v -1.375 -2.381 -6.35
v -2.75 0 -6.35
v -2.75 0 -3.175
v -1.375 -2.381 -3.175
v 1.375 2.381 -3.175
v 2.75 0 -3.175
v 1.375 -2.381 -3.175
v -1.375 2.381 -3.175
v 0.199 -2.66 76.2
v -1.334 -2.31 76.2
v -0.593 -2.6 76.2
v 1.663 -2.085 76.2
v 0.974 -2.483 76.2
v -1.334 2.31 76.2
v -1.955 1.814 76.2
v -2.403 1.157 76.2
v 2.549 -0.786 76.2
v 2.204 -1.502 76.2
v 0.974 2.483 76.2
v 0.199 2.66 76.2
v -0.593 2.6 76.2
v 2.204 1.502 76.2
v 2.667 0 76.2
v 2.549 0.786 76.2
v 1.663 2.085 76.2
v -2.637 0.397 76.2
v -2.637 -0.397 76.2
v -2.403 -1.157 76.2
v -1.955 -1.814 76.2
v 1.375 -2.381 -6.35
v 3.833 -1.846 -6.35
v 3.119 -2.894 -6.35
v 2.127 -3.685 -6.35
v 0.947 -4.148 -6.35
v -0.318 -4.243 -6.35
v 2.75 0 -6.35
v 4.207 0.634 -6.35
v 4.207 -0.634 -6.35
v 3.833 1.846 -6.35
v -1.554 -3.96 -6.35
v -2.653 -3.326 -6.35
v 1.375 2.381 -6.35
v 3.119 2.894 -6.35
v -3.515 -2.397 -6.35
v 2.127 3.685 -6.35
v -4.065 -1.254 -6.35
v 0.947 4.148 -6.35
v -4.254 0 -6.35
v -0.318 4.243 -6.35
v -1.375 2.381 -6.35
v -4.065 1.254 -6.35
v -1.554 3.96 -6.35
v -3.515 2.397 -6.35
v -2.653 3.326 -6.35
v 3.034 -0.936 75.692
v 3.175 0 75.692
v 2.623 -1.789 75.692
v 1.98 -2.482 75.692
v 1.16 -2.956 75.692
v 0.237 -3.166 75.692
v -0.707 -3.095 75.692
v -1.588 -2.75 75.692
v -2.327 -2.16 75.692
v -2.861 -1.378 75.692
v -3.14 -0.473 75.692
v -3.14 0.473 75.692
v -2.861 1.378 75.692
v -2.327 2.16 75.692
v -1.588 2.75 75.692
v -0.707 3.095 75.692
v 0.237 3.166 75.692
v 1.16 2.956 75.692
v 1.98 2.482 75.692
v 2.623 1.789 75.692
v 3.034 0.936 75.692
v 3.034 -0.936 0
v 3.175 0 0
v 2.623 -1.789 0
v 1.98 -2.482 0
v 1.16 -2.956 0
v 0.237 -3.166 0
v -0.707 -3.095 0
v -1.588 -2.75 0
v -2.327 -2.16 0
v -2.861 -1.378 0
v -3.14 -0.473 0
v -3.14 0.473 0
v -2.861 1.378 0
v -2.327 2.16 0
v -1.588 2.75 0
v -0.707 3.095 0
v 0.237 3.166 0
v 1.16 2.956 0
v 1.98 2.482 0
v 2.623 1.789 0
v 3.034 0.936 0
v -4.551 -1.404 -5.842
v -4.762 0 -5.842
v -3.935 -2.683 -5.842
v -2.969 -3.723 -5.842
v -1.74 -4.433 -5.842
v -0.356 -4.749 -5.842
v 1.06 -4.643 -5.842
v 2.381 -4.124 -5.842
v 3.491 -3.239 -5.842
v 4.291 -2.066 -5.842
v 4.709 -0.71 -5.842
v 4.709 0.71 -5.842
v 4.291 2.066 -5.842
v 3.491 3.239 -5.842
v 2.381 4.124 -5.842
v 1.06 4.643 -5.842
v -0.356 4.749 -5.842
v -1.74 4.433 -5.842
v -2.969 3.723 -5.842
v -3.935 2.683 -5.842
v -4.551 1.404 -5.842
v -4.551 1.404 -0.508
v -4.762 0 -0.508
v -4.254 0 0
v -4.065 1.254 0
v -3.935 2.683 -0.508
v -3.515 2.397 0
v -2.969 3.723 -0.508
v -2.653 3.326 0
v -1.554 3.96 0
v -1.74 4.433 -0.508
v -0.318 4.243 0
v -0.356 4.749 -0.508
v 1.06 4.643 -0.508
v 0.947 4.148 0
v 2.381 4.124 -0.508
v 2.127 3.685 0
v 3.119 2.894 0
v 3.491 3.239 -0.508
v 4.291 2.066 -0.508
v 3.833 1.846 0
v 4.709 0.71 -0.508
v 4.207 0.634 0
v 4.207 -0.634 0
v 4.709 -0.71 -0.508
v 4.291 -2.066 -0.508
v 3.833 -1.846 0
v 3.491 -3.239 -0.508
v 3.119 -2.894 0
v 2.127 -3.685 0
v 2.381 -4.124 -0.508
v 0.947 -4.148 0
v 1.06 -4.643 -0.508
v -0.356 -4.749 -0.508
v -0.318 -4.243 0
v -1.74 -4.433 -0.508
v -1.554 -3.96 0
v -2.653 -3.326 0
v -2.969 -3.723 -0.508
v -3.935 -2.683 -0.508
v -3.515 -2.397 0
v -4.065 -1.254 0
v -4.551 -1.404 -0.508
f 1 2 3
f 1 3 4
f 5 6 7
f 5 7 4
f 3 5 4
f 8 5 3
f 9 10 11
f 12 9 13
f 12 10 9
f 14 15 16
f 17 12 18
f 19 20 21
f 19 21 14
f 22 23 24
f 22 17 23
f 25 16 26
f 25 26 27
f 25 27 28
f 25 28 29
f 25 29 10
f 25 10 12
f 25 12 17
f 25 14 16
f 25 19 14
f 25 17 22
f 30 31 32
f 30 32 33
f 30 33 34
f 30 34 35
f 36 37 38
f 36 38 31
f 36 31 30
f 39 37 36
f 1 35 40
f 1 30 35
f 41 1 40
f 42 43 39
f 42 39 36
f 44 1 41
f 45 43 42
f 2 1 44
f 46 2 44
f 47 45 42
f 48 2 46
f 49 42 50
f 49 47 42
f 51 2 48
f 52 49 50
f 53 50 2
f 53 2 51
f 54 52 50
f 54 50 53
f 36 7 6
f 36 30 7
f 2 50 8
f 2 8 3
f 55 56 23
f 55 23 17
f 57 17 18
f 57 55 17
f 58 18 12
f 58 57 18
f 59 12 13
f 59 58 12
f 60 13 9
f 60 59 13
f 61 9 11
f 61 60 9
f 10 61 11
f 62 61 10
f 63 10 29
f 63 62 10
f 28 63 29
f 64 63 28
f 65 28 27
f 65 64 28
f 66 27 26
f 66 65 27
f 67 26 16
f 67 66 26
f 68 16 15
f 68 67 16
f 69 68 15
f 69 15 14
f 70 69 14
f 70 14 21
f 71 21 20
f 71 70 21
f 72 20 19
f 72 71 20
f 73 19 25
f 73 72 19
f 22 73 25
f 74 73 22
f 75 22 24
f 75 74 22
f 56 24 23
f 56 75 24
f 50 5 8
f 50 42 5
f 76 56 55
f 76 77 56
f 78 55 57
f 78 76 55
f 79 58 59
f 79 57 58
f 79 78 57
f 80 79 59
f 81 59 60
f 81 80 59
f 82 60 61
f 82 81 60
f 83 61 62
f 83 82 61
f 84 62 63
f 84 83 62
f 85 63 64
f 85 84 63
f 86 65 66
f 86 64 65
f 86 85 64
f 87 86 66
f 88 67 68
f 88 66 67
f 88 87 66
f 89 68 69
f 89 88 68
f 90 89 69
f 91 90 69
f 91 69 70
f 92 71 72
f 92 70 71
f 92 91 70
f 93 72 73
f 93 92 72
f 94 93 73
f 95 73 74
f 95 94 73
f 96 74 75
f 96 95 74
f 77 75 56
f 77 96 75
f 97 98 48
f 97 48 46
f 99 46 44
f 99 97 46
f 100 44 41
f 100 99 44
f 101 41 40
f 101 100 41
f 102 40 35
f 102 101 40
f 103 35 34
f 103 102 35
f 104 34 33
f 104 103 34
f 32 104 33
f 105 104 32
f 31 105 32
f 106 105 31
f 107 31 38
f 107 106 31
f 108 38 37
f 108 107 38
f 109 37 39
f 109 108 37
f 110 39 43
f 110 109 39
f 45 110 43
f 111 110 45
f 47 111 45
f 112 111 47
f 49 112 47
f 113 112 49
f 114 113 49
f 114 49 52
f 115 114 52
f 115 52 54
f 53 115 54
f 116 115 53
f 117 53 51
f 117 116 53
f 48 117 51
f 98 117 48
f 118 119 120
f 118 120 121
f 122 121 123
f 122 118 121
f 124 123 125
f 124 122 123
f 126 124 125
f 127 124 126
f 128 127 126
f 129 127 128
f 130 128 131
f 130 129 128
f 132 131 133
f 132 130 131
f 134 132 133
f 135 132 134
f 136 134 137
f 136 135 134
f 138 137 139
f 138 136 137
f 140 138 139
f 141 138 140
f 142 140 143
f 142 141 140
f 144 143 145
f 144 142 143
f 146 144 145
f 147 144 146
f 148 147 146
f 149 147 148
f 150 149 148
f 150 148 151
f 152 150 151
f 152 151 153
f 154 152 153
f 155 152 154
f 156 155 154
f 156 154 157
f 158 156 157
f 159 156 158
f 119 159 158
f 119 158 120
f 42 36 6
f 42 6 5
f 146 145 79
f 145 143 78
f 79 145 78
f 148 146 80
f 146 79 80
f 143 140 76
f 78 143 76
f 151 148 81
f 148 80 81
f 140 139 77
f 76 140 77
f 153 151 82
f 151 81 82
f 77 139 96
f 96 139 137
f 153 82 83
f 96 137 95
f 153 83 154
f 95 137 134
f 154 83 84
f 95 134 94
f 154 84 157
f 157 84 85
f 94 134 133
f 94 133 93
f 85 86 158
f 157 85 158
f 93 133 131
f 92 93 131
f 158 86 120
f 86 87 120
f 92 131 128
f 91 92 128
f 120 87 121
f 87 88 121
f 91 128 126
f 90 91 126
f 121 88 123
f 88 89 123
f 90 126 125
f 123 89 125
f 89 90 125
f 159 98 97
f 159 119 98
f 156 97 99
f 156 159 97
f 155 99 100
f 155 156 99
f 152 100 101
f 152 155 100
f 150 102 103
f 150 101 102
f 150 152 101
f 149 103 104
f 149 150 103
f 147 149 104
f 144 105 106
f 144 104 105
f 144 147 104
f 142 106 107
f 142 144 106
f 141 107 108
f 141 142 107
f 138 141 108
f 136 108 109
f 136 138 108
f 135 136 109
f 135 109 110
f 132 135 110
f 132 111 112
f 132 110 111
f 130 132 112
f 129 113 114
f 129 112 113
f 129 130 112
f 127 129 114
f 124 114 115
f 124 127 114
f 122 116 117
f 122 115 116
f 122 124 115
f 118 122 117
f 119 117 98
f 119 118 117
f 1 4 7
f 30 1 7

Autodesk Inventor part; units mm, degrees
ref_plane "YZ Plane" through (0, 0, 0) normal (1, 0, 0) x (0, 1, 0)
ref_plane "XZ Plane" through (0, 0, 0) normal (0, 1, 0) x (-1, 0, 0)
ref_plane "XY Plane" through (0, 0, 0) normal (0, 0, 1) x (1, 0, 0)
sketch "Sketch1" plane through (0, 0, 0) normal (0, 0, 1) x (1, 0, 0)
  circle A0 centre (0, 0) radius 3.175
  dimension "d0" = 6.35
extrude "Extrusion1" add sketch "Sketch1" along normal blind 76.2
sketch "Sketch2" plane through (0, 0, 0) normal (0, 0, -1) x (-1, 0, 0)
  circle A0 centre (0, 0) radius 3.175 projected
  circle A1 centre (0, 0) radius 4.7625
  dimension "d3" = 9.525
extrude "Extrusion2" add sketch "Sketch2" along normal blind 6.35 contours A0 | A1
sketch "Sketch3" plane through (0, 0, -6.35) normal (0, 0, -1) x (-1, 0, 0)
  circle A0 centre (0, 0) radius 4.7625 projected
  line L0 (-1.3748, 2.3812) -> (1.3748, 2.3813)
  line L1 (1.3748, 2.3813) -> (2.7496, 0)
  line L2 (2.7496, 0) -> (1.3748, -2.3812)
  line L3 (1.3748, -2.3812) -> (-1.3748, -2.3812)
  line L4 (-1.3748, -2.3812) -> (-2.7496, 0)
  line L5 (-2.7496, 0) -> (-1.3748, 2.3812)
  dimension "d6" = 4.7625
extrude "Extrusion3" cut sketch "Sketch3" against normal blind 3.175 contours L0 L1 L2 L3 L4 L5
chamfer "Chamfer1" distance 0.508 angle 45 3 edges at (-3.175, 0, 76.2) (4.7625, 0, 0) (4.7625, 0, -6.35)
thread "Thread1" size "1/4-20 UNC" class "2A" standard "ANSI Unified Screw Threads" length 25.4
properties part number "14-20 x750" material "Steel"
